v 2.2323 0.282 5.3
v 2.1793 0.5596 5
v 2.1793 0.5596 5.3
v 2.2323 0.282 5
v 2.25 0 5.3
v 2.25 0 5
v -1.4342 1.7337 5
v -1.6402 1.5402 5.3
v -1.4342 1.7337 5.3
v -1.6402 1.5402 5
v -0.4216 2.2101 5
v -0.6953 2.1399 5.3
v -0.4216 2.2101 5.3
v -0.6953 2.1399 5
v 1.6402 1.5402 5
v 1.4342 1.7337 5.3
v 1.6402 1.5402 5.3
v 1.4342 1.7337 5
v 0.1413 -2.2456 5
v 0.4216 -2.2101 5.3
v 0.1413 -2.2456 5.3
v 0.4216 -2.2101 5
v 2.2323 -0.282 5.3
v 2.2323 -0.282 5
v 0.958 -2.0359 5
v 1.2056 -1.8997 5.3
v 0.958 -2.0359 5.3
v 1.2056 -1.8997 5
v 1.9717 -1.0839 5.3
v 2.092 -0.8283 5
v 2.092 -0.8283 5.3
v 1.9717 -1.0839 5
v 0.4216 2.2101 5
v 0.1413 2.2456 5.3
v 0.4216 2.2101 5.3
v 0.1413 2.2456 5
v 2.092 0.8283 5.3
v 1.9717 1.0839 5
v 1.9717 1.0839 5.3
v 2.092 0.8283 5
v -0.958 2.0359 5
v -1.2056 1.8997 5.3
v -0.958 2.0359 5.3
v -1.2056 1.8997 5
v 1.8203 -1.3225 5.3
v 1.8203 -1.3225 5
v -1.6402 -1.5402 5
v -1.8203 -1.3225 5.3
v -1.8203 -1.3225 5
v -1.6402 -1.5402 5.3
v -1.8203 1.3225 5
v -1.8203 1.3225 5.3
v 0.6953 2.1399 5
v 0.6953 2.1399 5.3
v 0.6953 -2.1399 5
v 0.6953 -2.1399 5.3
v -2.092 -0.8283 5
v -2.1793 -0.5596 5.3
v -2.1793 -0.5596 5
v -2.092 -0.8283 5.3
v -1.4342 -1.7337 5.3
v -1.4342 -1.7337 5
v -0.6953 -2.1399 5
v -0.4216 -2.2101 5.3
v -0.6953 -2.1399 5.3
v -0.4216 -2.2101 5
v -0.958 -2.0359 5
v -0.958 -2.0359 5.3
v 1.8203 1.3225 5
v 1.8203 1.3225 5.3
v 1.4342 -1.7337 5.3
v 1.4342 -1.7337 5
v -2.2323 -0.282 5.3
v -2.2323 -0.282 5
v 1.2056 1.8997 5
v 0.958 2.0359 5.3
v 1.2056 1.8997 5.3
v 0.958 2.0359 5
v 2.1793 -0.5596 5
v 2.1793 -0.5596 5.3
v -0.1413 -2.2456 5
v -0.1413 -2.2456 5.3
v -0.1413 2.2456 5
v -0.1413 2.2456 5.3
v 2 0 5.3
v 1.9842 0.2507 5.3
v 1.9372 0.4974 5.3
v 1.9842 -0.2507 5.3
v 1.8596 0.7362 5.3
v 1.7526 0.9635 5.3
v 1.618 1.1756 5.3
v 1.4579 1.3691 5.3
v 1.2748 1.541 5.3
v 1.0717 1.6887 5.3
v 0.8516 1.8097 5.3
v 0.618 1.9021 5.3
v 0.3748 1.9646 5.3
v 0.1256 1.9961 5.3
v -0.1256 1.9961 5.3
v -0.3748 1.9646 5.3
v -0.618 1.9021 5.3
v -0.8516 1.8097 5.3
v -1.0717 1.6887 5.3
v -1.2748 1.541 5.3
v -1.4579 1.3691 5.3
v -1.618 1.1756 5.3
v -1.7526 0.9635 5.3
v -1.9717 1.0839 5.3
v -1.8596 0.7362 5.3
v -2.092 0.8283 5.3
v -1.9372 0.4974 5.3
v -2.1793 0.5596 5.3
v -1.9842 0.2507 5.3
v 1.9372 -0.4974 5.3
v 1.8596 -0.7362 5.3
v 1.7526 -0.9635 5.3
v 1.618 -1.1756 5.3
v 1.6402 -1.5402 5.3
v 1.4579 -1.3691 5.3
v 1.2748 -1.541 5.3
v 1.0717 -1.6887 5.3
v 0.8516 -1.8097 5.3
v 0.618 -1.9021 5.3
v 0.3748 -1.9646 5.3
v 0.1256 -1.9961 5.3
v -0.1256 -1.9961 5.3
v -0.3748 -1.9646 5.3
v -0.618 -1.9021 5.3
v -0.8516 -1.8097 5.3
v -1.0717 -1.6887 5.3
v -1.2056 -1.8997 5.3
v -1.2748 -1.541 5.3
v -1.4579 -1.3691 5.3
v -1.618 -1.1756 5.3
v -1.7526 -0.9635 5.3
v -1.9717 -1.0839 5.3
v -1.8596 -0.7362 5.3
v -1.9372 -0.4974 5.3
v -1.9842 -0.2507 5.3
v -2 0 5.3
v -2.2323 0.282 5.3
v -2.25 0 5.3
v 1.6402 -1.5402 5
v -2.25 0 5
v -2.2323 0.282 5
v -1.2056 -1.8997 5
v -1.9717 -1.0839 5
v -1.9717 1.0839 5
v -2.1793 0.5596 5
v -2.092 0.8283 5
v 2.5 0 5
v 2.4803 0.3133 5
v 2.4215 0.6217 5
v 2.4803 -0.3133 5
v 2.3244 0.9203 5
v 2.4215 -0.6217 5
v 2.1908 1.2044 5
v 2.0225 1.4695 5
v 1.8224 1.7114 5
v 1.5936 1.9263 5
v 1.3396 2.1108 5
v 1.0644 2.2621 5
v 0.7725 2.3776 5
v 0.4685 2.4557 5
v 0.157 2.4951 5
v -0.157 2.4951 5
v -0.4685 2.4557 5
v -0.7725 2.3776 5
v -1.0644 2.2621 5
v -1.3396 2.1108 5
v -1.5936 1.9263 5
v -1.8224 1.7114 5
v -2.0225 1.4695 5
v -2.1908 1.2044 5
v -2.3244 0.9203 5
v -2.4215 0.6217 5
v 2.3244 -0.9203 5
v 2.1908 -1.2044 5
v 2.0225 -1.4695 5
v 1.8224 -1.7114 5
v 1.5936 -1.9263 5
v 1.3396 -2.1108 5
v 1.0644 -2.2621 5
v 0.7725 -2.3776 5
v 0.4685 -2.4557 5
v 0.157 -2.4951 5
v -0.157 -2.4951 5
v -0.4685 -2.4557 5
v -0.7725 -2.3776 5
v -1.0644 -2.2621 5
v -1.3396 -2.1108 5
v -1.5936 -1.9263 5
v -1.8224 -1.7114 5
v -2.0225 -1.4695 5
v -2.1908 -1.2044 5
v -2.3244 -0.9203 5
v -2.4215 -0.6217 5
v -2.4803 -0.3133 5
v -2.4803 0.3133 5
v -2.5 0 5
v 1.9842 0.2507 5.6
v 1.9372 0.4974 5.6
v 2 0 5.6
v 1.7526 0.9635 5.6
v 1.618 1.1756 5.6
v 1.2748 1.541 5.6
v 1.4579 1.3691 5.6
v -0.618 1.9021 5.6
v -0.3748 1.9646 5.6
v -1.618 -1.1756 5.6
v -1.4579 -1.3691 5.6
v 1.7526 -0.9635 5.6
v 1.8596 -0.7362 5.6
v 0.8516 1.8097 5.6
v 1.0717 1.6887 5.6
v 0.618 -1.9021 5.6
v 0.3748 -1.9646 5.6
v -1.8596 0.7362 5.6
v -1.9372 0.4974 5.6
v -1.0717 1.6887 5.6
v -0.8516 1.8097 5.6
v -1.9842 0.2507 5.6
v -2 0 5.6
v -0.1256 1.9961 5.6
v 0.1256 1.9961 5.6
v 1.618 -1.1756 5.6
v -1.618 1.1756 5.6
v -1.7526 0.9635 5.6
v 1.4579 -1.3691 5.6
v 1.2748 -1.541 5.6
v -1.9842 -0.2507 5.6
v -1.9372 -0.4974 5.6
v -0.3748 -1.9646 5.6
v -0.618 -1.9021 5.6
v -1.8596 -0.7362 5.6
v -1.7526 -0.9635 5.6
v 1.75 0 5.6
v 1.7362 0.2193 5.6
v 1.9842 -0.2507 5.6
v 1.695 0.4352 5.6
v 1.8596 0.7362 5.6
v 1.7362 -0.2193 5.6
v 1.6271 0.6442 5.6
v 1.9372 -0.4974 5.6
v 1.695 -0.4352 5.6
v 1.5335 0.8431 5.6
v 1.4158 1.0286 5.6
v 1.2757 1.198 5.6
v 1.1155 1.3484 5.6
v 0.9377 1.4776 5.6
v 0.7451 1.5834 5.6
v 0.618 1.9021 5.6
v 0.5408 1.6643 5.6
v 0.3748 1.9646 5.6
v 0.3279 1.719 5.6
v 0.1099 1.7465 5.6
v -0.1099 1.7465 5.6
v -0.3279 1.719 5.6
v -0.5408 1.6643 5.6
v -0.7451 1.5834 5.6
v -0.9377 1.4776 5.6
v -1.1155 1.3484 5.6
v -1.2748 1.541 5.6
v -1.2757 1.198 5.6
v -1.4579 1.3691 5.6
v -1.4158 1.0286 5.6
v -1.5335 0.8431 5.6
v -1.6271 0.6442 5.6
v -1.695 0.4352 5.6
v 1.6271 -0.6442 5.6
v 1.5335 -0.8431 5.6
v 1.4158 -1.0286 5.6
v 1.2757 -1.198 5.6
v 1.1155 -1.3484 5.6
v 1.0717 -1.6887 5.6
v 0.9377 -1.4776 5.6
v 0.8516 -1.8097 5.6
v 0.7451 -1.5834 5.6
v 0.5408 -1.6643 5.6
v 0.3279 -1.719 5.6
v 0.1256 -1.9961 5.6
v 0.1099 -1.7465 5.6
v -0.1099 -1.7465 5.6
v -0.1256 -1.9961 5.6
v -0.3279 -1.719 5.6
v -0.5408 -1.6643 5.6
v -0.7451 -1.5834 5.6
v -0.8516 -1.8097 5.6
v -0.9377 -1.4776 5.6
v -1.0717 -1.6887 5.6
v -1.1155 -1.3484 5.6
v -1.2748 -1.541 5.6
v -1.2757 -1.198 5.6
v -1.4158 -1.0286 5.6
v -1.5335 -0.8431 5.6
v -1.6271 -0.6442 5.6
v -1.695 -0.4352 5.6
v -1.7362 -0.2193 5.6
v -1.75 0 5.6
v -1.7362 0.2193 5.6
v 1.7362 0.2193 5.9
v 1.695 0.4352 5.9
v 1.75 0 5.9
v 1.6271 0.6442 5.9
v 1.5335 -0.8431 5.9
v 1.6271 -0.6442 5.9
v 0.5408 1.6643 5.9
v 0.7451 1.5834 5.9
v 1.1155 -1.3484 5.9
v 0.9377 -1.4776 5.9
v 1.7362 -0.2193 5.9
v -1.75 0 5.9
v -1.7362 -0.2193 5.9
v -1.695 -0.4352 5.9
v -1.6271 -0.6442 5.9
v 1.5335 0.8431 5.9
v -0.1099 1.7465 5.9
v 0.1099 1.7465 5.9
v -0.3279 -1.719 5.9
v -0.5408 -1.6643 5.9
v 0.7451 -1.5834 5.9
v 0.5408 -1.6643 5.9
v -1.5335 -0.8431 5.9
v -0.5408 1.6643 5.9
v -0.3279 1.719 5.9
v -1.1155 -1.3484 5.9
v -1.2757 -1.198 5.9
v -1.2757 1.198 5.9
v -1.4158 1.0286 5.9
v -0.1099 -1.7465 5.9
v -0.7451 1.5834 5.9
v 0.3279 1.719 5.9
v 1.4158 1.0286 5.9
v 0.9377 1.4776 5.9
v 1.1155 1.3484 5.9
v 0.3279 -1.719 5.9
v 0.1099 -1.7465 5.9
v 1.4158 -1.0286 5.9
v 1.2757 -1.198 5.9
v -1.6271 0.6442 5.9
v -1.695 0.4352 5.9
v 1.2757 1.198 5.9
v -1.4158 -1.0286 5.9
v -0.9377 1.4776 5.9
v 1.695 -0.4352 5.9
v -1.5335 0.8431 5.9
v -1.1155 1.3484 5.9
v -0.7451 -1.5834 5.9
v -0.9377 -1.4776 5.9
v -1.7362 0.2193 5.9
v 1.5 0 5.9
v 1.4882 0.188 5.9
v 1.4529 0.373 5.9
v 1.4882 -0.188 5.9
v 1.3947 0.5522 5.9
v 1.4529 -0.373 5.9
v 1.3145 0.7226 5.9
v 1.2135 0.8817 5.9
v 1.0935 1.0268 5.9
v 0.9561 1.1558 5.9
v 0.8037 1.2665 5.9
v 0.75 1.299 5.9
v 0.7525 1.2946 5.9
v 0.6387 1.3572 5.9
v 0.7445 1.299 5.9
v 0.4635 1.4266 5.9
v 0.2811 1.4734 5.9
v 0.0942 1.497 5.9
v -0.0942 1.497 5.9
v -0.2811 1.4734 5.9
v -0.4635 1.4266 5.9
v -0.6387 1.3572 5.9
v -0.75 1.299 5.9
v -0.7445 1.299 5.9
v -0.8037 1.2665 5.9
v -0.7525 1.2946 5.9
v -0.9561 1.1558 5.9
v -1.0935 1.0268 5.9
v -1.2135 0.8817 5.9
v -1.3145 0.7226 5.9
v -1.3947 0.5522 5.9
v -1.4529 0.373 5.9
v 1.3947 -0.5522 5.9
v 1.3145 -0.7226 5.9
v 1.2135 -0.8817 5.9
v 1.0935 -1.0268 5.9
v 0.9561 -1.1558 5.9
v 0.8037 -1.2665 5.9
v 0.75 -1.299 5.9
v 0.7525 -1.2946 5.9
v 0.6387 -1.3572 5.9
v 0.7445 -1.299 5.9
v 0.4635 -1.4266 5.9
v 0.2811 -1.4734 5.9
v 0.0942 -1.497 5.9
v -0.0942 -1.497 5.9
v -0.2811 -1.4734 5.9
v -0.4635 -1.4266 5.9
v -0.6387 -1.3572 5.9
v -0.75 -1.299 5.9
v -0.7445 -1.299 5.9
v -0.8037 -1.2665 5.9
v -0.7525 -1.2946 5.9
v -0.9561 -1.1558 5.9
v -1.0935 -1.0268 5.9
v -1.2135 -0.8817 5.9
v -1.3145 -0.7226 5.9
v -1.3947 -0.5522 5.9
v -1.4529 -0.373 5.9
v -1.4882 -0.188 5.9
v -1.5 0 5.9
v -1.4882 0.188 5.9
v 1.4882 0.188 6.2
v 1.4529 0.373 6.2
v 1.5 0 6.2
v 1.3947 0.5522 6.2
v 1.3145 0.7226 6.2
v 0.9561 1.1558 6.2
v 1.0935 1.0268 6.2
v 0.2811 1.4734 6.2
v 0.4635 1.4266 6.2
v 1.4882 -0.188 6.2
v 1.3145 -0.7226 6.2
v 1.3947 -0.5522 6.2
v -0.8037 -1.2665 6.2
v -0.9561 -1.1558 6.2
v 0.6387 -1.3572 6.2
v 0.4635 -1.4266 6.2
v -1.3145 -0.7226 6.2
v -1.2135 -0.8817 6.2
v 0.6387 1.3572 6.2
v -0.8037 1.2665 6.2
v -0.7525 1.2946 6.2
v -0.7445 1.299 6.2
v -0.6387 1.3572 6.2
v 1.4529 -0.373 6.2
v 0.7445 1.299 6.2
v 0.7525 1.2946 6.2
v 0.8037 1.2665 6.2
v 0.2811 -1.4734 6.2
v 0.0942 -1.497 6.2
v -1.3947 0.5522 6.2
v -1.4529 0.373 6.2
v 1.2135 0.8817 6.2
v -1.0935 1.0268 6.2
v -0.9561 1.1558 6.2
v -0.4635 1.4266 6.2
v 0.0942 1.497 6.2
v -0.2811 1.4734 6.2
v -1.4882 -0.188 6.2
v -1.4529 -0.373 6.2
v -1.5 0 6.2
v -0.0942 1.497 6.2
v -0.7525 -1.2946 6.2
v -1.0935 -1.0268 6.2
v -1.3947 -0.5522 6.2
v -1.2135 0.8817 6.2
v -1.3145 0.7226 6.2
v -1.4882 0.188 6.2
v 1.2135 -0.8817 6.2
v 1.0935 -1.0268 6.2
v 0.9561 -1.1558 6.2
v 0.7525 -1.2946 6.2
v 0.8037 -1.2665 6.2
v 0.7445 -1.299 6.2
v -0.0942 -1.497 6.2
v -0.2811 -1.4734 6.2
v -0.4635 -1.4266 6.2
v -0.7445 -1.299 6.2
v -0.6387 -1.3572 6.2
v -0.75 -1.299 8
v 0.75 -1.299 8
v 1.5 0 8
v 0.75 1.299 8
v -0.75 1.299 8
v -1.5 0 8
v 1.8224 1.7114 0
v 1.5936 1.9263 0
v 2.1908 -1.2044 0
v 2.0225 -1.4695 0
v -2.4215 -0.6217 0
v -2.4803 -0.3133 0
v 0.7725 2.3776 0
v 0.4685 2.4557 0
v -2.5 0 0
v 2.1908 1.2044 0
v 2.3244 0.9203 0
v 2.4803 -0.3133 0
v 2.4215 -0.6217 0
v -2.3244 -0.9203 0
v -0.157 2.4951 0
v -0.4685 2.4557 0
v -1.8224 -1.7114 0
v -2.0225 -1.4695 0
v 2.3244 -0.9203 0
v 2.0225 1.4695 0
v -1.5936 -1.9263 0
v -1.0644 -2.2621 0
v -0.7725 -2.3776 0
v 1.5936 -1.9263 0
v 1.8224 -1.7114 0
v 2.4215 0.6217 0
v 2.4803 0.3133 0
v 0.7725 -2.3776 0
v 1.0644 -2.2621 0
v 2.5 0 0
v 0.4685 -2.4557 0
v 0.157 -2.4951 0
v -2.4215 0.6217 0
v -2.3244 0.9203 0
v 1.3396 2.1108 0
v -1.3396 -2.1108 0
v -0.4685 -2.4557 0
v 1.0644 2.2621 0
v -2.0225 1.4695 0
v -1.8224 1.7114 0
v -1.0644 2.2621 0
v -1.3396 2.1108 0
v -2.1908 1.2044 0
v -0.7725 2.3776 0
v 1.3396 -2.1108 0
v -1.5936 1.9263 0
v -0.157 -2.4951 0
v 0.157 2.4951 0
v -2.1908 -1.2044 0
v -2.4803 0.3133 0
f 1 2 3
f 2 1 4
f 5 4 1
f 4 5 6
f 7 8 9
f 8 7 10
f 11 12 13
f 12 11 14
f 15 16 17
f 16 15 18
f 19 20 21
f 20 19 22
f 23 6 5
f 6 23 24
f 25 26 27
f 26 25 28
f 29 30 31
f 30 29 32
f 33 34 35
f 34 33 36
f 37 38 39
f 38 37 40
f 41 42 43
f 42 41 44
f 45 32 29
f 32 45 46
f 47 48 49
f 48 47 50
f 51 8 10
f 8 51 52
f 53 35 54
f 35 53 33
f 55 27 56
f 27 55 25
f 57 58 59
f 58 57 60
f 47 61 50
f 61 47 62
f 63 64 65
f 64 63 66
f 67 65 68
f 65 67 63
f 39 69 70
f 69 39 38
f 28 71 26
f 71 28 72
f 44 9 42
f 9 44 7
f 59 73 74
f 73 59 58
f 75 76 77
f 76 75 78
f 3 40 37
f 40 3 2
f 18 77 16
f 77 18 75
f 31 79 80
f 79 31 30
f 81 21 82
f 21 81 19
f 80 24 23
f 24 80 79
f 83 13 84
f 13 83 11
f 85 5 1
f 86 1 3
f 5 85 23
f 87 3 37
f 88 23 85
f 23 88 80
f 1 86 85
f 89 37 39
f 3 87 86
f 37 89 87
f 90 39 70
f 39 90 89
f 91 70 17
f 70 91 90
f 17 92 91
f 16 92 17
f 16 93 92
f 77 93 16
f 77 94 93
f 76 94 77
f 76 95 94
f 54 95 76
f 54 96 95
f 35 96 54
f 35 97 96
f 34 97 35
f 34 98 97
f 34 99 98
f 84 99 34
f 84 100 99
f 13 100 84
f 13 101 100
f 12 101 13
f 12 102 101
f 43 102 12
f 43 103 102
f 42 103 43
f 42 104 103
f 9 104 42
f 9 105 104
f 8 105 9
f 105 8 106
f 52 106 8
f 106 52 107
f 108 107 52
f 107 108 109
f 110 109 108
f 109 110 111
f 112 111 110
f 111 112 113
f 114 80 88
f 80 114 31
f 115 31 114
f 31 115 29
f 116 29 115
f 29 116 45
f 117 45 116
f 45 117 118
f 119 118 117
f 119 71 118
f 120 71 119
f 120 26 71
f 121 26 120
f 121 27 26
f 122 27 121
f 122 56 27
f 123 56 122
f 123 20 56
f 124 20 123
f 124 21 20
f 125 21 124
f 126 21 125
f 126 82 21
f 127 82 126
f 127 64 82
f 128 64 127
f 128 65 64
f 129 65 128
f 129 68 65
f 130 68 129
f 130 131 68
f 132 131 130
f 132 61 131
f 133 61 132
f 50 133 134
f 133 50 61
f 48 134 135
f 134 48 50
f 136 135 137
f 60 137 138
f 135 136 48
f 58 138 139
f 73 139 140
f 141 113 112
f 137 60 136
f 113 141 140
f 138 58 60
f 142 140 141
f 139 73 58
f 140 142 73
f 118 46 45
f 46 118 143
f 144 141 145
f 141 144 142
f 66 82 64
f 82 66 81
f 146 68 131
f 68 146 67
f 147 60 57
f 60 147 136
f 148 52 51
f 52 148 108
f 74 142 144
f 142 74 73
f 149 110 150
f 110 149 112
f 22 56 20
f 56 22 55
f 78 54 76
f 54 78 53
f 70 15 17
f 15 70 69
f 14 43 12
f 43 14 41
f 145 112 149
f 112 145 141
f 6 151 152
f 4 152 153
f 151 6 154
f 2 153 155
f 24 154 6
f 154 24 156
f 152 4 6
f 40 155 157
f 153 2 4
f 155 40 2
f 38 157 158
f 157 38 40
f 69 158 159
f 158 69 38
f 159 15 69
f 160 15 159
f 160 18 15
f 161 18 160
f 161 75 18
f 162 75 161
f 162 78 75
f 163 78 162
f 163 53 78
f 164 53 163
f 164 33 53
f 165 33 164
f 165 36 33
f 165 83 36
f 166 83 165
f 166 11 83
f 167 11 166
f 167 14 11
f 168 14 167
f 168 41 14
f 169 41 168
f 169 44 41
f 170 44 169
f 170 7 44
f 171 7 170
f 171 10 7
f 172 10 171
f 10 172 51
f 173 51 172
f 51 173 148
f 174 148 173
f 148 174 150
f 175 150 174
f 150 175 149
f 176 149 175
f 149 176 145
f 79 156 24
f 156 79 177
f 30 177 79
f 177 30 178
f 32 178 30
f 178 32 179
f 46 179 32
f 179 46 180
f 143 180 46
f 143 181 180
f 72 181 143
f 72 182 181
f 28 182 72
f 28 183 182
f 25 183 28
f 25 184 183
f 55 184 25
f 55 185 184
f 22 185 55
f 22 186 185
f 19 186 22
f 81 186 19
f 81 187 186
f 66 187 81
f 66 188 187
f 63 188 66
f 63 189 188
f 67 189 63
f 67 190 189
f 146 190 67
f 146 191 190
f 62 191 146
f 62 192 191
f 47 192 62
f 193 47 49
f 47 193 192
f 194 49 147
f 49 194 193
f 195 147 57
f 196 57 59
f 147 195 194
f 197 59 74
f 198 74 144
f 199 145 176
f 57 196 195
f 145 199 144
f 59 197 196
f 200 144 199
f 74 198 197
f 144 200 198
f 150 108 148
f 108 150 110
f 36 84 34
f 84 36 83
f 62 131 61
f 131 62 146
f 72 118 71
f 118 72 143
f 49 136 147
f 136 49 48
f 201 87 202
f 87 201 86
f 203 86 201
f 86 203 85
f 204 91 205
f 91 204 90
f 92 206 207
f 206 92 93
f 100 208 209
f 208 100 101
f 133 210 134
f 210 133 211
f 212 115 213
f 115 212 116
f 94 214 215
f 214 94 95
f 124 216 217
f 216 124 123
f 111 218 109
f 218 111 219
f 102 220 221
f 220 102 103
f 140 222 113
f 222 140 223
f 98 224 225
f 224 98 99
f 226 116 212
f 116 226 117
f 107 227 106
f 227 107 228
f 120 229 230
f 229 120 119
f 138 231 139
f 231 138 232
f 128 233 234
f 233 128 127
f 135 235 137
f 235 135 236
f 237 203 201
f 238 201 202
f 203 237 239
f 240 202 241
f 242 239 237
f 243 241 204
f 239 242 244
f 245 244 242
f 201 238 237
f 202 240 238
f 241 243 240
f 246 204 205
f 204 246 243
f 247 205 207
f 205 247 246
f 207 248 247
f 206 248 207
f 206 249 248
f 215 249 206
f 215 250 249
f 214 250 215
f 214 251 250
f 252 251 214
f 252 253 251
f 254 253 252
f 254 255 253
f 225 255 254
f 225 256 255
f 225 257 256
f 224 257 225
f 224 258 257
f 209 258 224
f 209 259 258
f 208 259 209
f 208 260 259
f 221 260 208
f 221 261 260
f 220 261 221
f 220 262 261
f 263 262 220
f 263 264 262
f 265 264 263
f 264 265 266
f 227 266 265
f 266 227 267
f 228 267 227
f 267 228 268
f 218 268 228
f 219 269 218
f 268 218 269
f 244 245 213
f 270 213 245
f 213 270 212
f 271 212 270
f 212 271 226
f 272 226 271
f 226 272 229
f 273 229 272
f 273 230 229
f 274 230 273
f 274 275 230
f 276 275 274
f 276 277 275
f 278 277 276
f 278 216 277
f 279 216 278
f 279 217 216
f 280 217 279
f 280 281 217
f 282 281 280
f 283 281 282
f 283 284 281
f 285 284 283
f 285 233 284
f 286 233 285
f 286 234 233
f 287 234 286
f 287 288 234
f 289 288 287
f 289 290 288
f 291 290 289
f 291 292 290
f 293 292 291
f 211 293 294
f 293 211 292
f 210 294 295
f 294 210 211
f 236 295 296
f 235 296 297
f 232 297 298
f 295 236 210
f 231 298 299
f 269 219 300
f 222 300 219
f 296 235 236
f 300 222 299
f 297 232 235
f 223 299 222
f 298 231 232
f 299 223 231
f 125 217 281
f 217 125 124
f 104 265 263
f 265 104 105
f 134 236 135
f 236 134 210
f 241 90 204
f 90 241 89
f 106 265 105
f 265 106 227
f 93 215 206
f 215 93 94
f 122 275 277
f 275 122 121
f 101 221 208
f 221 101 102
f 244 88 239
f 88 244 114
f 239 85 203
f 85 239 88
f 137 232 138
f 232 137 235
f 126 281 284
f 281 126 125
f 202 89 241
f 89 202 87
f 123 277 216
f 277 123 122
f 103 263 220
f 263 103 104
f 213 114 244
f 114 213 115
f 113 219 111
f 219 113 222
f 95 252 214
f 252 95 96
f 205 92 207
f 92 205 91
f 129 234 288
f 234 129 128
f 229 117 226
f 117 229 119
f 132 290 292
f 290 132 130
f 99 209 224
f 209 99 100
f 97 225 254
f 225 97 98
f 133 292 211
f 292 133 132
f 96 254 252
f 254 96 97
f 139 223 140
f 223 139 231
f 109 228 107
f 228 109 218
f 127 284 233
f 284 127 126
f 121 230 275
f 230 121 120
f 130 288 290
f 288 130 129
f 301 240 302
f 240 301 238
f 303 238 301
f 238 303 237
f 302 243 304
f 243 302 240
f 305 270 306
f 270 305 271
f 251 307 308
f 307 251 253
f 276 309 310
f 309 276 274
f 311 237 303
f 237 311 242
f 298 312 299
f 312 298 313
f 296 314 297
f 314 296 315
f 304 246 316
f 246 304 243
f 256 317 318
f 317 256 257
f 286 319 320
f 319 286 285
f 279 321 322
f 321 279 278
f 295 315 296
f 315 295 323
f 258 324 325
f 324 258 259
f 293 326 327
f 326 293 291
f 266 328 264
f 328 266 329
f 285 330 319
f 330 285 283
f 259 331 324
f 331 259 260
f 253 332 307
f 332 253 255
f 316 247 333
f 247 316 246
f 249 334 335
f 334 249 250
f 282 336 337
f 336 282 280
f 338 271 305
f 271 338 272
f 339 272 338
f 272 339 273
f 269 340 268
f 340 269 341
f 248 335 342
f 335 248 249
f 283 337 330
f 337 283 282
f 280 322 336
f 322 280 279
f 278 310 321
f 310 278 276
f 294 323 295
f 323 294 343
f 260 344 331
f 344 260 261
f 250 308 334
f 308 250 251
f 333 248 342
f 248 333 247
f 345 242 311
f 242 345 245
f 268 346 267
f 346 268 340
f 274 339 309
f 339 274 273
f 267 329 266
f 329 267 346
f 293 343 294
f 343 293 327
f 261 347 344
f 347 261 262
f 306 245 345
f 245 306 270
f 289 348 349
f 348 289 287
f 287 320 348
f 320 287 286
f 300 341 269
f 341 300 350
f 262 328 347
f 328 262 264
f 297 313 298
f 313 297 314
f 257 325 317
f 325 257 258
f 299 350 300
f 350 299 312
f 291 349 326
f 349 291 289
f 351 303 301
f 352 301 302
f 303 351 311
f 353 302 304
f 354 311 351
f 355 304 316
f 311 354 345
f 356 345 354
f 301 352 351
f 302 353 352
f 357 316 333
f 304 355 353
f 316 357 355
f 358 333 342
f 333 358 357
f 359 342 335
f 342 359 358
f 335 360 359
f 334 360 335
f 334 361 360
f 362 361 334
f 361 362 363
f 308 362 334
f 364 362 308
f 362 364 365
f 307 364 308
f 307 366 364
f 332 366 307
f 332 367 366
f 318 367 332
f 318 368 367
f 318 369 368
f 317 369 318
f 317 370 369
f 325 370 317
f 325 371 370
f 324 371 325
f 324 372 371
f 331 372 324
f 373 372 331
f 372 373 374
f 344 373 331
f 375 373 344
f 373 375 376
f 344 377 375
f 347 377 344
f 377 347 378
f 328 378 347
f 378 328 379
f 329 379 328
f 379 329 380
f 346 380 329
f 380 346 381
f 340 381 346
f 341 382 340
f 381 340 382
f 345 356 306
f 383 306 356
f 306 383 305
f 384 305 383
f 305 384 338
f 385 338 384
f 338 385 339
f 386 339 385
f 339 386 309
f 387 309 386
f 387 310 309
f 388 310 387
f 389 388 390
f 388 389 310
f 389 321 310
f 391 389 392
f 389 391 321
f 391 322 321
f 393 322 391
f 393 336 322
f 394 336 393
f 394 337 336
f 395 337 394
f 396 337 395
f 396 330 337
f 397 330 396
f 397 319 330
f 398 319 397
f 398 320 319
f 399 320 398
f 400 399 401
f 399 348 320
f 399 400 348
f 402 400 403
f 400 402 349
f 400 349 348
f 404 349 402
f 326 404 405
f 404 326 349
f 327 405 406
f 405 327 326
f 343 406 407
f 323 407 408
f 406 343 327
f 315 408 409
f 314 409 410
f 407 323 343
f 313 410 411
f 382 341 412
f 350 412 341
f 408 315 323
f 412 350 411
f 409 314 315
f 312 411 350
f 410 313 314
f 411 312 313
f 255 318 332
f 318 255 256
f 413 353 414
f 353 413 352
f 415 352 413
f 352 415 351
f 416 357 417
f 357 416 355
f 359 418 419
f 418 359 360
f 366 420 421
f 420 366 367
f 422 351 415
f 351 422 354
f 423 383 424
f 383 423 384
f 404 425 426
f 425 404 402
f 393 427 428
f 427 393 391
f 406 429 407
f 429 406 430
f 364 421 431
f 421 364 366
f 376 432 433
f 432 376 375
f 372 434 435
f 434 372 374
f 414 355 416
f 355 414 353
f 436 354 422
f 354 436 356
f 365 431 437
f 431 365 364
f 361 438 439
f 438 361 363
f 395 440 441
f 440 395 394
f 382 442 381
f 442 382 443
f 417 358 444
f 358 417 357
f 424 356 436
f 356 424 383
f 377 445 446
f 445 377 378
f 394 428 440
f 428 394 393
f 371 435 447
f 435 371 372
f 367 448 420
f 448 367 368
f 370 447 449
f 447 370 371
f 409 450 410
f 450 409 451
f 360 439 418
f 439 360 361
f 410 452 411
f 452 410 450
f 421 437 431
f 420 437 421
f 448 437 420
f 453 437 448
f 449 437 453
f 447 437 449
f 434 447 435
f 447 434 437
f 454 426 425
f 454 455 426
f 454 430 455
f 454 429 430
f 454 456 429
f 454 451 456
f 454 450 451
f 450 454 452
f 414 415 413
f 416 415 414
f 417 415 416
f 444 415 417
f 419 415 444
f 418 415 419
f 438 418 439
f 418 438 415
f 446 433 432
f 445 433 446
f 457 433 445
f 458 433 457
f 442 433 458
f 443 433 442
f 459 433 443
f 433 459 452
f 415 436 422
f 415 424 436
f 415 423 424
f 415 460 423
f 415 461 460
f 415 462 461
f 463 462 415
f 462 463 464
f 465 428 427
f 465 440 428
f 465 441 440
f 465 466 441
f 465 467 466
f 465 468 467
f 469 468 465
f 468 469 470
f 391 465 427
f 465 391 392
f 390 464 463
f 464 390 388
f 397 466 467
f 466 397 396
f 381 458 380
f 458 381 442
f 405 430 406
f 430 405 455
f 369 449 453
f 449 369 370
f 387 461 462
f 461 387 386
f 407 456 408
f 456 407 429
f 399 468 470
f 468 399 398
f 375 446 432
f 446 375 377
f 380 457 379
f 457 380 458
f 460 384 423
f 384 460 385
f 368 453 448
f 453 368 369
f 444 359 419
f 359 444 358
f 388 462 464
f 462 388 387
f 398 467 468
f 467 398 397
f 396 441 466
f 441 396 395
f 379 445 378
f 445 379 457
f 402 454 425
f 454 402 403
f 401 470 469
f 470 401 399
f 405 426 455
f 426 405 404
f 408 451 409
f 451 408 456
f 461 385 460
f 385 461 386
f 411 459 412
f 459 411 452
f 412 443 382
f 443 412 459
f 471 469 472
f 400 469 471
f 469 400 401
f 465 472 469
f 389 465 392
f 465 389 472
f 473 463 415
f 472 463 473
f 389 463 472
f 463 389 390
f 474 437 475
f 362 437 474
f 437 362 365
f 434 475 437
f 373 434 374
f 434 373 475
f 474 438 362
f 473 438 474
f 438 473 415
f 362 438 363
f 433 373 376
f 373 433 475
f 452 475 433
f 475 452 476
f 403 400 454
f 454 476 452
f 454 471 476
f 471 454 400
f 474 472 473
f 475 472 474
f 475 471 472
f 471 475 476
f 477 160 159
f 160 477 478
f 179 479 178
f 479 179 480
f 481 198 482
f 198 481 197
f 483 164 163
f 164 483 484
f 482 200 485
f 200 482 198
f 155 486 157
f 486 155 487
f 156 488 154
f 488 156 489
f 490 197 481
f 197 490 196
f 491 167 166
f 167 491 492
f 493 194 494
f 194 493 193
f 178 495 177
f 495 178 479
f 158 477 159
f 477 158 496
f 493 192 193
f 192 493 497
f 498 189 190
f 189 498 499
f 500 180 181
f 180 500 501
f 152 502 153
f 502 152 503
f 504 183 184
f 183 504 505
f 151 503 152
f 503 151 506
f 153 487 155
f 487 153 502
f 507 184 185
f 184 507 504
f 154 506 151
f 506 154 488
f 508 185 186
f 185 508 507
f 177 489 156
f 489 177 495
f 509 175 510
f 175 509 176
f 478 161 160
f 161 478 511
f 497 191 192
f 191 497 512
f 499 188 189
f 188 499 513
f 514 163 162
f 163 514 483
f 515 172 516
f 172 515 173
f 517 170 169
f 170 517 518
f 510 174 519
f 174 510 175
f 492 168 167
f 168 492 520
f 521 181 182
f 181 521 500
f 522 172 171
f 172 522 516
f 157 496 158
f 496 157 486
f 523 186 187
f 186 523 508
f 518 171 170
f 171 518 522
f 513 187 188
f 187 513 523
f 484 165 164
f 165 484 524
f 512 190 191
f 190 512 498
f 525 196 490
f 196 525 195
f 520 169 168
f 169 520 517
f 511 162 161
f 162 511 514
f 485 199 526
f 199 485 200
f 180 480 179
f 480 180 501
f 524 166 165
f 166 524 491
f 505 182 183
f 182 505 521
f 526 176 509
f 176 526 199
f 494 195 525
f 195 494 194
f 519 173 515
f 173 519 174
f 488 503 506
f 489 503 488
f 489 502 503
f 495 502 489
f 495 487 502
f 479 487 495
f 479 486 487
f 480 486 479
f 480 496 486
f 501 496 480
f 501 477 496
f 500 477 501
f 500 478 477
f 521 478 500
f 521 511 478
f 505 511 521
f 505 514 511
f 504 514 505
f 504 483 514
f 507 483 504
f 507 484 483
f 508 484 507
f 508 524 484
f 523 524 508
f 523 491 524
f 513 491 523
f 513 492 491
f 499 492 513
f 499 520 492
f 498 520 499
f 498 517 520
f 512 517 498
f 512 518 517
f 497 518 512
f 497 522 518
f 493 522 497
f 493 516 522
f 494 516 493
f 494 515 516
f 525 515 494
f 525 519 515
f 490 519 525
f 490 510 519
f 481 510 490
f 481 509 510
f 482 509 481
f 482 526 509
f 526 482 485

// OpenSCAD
$fn=50;

module propeller_nut_wrench() {
  // M5 Nut Wrench
  wrench_h = 20.0;
  lever_w = 10.0;
  nut_w = 10.0;
  nut_h = 8;

  difference() {
    cylinder(h=wrench_h, r=(nut_w * 1.5) / 2.0, center=true);

    translate([0.0, 0.0, wrench_h / 2.0 - nut_h / 2.0])
      cylinder(h=nut_h + 0.01, r=nut_w / 2.0, $fn=6, center=true);
  }

  translate([0.0, 0.0, - wrench_h / 2.0 + lever_w / 2.0])
    cube([nut_w * 0.8, nut_w * 6.0, lever_w], center=true);
}

module hex_key_tool() {
  tool_w = 5.0;
  tool_h = 5.0;
  bit_w = 3.0;
  bit_h = 3.0;

  // Tool bit
  translate([0, 0, tool_h + bit_h / 2])
    cylinder(r=bit_w / 2, h=bit_h, $fn=6, center=true);

  // Tool connector
  for (i = [0.0:0.1:0.8]) {
    conn_r = (tool_w / 2) * (1.0 - i);
    translate([0, 0, tool_h + (bit_h * i) / 2])
      cylinder(r=conn_r, h=(bit_h * i), center=true);
  }

  // Tool handle
  translate([0, 0, tool_h / 2])
    cylinder(r=tool_w / 2, h=tool_h, center=true);
}

// propeller_nut_wrench();
hex_key_tool();
